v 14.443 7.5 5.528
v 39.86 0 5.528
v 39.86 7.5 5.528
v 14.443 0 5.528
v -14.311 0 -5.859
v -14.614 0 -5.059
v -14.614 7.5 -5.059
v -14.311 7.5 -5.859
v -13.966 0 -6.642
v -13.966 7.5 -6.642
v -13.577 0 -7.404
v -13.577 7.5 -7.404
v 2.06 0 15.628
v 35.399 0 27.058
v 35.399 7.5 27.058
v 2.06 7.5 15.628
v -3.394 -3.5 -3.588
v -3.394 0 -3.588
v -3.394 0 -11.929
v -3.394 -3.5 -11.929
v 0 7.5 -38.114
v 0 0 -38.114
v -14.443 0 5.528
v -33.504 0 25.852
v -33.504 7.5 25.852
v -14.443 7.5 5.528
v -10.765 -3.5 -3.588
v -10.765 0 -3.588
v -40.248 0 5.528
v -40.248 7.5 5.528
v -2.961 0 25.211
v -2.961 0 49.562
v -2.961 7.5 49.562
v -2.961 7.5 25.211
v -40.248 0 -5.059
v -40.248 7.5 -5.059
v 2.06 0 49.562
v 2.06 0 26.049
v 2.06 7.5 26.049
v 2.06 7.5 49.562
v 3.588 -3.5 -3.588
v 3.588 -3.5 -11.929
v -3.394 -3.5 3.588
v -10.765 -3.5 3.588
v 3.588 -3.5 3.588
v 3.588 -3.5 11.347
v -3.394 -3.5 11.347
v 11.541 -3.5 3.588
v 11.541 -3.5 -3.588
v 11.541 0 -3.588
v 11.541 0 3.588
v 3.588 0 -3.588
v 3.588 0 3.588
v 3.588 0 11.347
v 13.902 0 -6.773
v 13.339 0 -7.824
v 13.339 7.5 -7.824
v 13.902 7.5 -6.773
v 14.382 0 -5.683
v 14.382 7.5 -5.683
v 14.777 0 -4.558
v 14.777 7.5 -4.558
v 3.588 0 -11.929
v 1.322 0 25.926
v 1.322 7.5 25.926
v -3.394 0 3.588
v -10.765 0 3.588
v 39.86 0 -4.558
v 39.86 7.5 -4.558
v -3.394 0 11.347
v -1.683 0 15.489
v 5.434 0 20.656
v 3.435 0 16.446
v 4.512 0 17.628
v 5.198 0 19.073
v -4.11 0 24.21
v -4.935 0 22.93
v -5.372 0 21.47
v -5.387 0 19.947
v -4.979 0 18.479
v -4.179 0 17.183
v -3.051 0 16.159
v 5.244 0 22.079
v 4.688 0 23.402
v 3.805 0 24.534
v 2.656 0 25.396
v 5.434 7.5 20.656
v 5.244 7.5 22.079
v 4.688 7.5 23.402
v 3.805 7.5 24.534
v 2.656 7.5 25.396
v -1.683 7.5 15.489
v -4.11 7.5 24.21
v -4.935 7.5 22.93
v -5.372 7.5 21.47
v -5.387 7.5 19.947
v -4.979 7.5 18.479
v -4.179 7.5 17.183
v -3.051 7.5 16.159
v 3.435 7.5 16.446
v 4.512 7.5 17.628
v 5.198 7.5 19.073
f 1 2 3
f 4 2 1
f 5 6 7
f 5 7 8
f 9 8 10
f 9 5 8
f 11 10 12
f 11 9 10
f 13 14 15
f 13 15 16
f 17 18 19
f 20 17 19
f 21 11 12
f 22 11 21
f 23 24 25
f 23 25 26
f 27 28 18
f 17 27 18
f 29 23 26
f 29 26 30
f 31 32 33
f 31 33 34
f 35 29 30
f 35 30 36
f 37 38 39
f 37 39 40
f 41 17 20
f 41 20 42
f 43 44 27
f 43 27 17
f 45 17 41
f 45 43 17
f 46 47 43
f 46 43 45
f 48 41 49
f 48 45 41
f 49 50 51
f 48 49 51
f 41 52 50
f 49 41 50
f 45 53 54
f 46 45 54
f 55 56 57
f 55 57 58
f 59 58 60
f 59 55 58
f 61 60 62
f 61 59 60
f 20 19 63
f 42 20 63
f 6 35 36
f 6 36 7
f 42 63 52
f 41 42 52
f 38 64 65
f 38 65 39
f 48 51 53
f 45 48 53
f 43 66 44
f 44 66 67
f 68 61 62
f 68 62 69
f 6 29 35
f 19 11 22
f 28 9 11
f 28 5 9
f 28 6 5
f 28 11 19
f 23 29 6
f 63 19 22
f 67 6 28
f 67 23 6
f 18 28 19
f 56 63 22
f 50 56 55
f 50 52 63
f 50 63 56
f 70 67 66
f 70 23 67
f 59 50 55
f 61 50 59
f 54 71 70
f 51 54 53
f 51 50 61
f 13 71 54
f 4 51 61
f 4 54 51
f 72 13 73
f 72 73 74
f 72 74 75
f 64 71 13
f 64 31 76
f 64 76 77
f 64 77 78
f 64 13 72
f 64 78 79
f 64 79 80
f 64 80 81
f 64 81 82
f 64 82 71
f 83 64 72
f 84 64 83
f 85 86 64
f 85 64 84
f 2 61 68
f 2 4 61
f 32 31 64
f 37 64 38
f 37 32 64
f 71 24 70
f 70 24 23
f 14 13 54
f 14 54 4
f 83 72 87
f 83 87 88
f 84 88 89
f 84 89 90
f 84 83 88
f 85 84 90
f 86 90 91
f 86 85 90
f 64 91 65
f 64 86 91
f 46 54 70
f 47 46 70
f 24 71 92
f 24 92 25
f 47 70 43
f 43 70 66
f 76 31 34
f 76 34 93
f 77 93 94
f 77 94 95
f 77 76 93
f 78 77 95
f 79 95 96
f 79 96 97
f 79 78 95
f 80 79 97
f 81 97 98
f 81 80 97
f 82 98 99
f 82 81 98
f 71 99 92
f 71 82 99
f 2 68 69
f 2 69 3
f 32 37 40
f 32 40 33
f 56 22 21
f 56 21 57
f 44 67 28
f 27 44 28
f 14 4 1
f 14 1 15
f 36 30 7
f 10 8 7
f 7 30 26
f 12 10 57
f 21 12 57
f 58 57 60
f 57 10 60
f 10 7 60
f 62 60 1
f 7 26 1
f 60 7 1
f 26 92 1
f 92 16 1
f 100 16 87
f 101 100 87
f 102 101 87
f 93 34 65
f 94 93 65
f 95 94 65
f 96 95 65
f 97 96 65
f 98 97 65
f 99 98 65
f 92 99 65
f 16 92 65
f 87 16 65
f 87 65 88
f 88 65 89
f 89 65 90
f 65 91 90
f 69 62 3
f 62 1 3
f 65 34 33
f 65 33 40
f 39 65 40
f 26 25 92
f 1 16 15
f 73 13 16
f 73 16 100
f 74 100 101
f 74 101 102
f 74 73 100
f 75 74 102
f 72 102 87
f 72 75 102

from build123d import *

# Parameters (mm, degrees)
F0_R      = 15.4644174612
F1_DEPTH  = 7.5
F3_DEPTH  = 3.5
F5_DEPTH  = 7.5
F7_DEPTH  = 7.5
F9_DEPTH  = 7.5
F11_DEPTH = 7.5
F13_DEPTH = 7.5
F15_DEPTH = 7.5
F17_DEPTH = 7.5
F18_W     = 5.4945703596
F18_H     = 28.8444776088
F19_DEPTH = 7.5
F22_DEPTH = 7.5


with BuildPart() as f1:
    # F0 (on Front) → F1 (new body)
    with BuildSketch(Plane.XZ):
        Circle(F0_R)
    extrude(amount=-F1_DEPTH)

    # F2 (on Front) → F3 (join)
    with BuildSketch(Plane.XZ):
        Polygon((3.5883630626, 11.3469837233), (-3.3943967428, 11.3469837233), (-3.3943967428, 3.5883623641), (-10.7650868595, 3.5883623641), (-10.7650868595, -3.5883623641), (-3.3943967428, -3.5883623641), (-3.3943967428, -11.9288796559), (3.5883630626, -11.9288796559), (3.5883630626, -3.5883623641), (11.5409484133, -3.5883623641), (11.5409484133, 3.5883623641), (3.5883630626, 3.5883623641), align=None)
    extrude(amount=F3_DEPTH)

    # F4 (on face) → F5 (join)
    with BuildSketch(Plane.XZ):
        with BuildLine():
            Line((-40.2478465542, -5.0589637569), (-14.6135243224, -5.0589637569))
            ThreePointArc((-14.6135243224, -5.0589637569), (-15.4624028659, 0.2496097512), (-14.442618561, 5.5280174129))
            Line((-14.442618561, 5.5280174129), (-40.2478465542, 5.5280174129))
            Line((-40.2478465542, 5.5280174129), (-40.2478465542, -5.0589637569))
        make_face()
    extrude(amount=-F5_DEPTH)

    # F6 (on face) → F7 (join)
    with BuildSketch(Plane.XZ):
        with BuildLine():
            Line((39.8599132895, 5.5280174129), (14.442618561, 5.5280174129))
            ThreePointArc((14.442618561, 5.5280174129), (15.4559066, 0.512989853), (14.7773852023, -4.5581897721))
            Line((14.7773852023, -4.5581897721), (39.8599132895, -4.5581897721))
            Line((39.8599132895, -4.5581897721), (39.8599132895, 5.5280174129))
        make_face()
    extrude(amount=-F7_DEPTH)

    # F8 (on face) → F9 (join)
    with BuildSketch(Plane.XZ):
        with BuildLine():
            ThreePointArc((13.3392752441, -7.8238061951), (-0.2412620254, -15.4625353694), (-13.5768721894, -7.4038333969))
            Line((-13.5768721894, -7.4038333969), (0, -38.1142273545))
            Line((0, -38.1142273545), (13.3392752441, -7.8238061951))
        make_face()
    extrude(amount=-F9_DEPTH)

    # F10 (on face) → F11 (join)
    with BuildSketch(Plane.XZ):
        with BuildLine():
            Line((1.4583327306, 20.6556674093), (-1.6825530911, 20.6556674093))
            Line((-1.6825530911, 20.6556674093), (-1.6825530911, 15.3955017152))
            Line((-1.6825530911, 15.3955017152), (-1.4583327306, 15.3955017152))
            ThreePointArc((-1.4583327306, 15.3955017152), (0, 15.4644174612), (1.4583327306, 15.3955017152))
            Line((1.4583327306, 15.3955017152), (1.4583327306, 20.6556674093))
        make_face()
    extrude(amount=-F11_DEPTH)

    # F12 (on face) → F13 (join)
    with BuildSketch(Plane.XZ):
        with BuildLine():
            ThreePointArc((1.4583327306, 15.4214656697), (4.3270974304, 17.3693579241), (5.4335625702, 20.6556674093))
            ThreePointArc((5.4335625702, 20.6556674093), (-3.1922832508, 25.05259018), (-1.6825530911, 15.4891775661))
            Line((-1.6825530911, 15.4891775661), (-1.6825530911, 20.6556674093))
            Line((-1.6825530911, 20.6556674093), (1.4583327306, 20.6556674093))
            Line((1.4583327306, 20.6556674093), (1.4583327306, 15.4214656697))
        make_face()
    extrude(amount=-F13_DEPTH)

    # F14 (on face) → F15 (join)
    with BuildSketch(Plane.XZ):
        with BuildLine():
            Line((35.3987067938, 27.0581915975), (2.0601032187, 15.6277874452))
            ThreePointArc((2.0601032187, 15.6277874452), (1.7622400662, 15.5158121435), (1.4583327306, 15.4214656697))
            Line((1.4583327306, 15.4214656697), (1.4583327306, 15.3955017152))
            ThreePointArc((1.4583327306, 15.3955017152), (9.3569158706, 12.312446256), (14.442618561, 5.5280174129))
            Line((14.442618561, 5.5280174129), (35.3987067938, 27.0581915975))
        make_face()
    extrude(amount=-F15_DEPTH)

    # F16 (on face) → F17 (join)
    with BuildSketch(Plane.XZ):
        with BuildLine():
            Line((-1.6825530911, 15.3955017152), (-1.6825530911, 15.4891775661))
            Line((-1.6825530911, 15.4891775661), (-33.5039995381, 25.8523592827))
            Line((-33.5039995381, 25.8523592827), (-14.442618561, 5.5280174129))
            ThreePointArc((-14.442618561, 5.5280174129), (-9.3569158706, 12.312446256), (-1.4583327306, 15.3955017152))
            Line((-1.4583327306, 15.3955017152), (-1.6825530911, 15.3955017152))
        make_face()
    extrude(amount=-F17_DEPTH)

    # F21 (on face) → F22 (join)
    with BuildSketch(Plane.XZ):
        with BuildLine():
            Line((-2.9614820185, 49.562137616), (-2.9614820185, 25.2112383349))
            ThreePointArc((-2.9614820185, 25.2112383349), (-0.8941182921, 26.0151594267), (1.3222555048, 25.9258896612))
            Line((1.3222555048, 25.9258896612), (2.0601032187, 26.0489840022))
            Line((2.0601032187, 26.0489840022), (2.0601032187, 49.562137616))
            Line((2.0601032187, 49.562137616), (-2.9614820185, 49.562137616))
        make_face()
    extrude(amount=-F22_DEPTH)


with BuildPart() as f19:
    # F18 (on Front) → F19 (new body)
    with BuildSketch(Plane.XZ):
        with Locations((0.3433788661, 40.6340872869)):
            Rectangle(F18_W, F18_H)
    extrude(amount=-F19_DEPTH)


solid = f1.part
